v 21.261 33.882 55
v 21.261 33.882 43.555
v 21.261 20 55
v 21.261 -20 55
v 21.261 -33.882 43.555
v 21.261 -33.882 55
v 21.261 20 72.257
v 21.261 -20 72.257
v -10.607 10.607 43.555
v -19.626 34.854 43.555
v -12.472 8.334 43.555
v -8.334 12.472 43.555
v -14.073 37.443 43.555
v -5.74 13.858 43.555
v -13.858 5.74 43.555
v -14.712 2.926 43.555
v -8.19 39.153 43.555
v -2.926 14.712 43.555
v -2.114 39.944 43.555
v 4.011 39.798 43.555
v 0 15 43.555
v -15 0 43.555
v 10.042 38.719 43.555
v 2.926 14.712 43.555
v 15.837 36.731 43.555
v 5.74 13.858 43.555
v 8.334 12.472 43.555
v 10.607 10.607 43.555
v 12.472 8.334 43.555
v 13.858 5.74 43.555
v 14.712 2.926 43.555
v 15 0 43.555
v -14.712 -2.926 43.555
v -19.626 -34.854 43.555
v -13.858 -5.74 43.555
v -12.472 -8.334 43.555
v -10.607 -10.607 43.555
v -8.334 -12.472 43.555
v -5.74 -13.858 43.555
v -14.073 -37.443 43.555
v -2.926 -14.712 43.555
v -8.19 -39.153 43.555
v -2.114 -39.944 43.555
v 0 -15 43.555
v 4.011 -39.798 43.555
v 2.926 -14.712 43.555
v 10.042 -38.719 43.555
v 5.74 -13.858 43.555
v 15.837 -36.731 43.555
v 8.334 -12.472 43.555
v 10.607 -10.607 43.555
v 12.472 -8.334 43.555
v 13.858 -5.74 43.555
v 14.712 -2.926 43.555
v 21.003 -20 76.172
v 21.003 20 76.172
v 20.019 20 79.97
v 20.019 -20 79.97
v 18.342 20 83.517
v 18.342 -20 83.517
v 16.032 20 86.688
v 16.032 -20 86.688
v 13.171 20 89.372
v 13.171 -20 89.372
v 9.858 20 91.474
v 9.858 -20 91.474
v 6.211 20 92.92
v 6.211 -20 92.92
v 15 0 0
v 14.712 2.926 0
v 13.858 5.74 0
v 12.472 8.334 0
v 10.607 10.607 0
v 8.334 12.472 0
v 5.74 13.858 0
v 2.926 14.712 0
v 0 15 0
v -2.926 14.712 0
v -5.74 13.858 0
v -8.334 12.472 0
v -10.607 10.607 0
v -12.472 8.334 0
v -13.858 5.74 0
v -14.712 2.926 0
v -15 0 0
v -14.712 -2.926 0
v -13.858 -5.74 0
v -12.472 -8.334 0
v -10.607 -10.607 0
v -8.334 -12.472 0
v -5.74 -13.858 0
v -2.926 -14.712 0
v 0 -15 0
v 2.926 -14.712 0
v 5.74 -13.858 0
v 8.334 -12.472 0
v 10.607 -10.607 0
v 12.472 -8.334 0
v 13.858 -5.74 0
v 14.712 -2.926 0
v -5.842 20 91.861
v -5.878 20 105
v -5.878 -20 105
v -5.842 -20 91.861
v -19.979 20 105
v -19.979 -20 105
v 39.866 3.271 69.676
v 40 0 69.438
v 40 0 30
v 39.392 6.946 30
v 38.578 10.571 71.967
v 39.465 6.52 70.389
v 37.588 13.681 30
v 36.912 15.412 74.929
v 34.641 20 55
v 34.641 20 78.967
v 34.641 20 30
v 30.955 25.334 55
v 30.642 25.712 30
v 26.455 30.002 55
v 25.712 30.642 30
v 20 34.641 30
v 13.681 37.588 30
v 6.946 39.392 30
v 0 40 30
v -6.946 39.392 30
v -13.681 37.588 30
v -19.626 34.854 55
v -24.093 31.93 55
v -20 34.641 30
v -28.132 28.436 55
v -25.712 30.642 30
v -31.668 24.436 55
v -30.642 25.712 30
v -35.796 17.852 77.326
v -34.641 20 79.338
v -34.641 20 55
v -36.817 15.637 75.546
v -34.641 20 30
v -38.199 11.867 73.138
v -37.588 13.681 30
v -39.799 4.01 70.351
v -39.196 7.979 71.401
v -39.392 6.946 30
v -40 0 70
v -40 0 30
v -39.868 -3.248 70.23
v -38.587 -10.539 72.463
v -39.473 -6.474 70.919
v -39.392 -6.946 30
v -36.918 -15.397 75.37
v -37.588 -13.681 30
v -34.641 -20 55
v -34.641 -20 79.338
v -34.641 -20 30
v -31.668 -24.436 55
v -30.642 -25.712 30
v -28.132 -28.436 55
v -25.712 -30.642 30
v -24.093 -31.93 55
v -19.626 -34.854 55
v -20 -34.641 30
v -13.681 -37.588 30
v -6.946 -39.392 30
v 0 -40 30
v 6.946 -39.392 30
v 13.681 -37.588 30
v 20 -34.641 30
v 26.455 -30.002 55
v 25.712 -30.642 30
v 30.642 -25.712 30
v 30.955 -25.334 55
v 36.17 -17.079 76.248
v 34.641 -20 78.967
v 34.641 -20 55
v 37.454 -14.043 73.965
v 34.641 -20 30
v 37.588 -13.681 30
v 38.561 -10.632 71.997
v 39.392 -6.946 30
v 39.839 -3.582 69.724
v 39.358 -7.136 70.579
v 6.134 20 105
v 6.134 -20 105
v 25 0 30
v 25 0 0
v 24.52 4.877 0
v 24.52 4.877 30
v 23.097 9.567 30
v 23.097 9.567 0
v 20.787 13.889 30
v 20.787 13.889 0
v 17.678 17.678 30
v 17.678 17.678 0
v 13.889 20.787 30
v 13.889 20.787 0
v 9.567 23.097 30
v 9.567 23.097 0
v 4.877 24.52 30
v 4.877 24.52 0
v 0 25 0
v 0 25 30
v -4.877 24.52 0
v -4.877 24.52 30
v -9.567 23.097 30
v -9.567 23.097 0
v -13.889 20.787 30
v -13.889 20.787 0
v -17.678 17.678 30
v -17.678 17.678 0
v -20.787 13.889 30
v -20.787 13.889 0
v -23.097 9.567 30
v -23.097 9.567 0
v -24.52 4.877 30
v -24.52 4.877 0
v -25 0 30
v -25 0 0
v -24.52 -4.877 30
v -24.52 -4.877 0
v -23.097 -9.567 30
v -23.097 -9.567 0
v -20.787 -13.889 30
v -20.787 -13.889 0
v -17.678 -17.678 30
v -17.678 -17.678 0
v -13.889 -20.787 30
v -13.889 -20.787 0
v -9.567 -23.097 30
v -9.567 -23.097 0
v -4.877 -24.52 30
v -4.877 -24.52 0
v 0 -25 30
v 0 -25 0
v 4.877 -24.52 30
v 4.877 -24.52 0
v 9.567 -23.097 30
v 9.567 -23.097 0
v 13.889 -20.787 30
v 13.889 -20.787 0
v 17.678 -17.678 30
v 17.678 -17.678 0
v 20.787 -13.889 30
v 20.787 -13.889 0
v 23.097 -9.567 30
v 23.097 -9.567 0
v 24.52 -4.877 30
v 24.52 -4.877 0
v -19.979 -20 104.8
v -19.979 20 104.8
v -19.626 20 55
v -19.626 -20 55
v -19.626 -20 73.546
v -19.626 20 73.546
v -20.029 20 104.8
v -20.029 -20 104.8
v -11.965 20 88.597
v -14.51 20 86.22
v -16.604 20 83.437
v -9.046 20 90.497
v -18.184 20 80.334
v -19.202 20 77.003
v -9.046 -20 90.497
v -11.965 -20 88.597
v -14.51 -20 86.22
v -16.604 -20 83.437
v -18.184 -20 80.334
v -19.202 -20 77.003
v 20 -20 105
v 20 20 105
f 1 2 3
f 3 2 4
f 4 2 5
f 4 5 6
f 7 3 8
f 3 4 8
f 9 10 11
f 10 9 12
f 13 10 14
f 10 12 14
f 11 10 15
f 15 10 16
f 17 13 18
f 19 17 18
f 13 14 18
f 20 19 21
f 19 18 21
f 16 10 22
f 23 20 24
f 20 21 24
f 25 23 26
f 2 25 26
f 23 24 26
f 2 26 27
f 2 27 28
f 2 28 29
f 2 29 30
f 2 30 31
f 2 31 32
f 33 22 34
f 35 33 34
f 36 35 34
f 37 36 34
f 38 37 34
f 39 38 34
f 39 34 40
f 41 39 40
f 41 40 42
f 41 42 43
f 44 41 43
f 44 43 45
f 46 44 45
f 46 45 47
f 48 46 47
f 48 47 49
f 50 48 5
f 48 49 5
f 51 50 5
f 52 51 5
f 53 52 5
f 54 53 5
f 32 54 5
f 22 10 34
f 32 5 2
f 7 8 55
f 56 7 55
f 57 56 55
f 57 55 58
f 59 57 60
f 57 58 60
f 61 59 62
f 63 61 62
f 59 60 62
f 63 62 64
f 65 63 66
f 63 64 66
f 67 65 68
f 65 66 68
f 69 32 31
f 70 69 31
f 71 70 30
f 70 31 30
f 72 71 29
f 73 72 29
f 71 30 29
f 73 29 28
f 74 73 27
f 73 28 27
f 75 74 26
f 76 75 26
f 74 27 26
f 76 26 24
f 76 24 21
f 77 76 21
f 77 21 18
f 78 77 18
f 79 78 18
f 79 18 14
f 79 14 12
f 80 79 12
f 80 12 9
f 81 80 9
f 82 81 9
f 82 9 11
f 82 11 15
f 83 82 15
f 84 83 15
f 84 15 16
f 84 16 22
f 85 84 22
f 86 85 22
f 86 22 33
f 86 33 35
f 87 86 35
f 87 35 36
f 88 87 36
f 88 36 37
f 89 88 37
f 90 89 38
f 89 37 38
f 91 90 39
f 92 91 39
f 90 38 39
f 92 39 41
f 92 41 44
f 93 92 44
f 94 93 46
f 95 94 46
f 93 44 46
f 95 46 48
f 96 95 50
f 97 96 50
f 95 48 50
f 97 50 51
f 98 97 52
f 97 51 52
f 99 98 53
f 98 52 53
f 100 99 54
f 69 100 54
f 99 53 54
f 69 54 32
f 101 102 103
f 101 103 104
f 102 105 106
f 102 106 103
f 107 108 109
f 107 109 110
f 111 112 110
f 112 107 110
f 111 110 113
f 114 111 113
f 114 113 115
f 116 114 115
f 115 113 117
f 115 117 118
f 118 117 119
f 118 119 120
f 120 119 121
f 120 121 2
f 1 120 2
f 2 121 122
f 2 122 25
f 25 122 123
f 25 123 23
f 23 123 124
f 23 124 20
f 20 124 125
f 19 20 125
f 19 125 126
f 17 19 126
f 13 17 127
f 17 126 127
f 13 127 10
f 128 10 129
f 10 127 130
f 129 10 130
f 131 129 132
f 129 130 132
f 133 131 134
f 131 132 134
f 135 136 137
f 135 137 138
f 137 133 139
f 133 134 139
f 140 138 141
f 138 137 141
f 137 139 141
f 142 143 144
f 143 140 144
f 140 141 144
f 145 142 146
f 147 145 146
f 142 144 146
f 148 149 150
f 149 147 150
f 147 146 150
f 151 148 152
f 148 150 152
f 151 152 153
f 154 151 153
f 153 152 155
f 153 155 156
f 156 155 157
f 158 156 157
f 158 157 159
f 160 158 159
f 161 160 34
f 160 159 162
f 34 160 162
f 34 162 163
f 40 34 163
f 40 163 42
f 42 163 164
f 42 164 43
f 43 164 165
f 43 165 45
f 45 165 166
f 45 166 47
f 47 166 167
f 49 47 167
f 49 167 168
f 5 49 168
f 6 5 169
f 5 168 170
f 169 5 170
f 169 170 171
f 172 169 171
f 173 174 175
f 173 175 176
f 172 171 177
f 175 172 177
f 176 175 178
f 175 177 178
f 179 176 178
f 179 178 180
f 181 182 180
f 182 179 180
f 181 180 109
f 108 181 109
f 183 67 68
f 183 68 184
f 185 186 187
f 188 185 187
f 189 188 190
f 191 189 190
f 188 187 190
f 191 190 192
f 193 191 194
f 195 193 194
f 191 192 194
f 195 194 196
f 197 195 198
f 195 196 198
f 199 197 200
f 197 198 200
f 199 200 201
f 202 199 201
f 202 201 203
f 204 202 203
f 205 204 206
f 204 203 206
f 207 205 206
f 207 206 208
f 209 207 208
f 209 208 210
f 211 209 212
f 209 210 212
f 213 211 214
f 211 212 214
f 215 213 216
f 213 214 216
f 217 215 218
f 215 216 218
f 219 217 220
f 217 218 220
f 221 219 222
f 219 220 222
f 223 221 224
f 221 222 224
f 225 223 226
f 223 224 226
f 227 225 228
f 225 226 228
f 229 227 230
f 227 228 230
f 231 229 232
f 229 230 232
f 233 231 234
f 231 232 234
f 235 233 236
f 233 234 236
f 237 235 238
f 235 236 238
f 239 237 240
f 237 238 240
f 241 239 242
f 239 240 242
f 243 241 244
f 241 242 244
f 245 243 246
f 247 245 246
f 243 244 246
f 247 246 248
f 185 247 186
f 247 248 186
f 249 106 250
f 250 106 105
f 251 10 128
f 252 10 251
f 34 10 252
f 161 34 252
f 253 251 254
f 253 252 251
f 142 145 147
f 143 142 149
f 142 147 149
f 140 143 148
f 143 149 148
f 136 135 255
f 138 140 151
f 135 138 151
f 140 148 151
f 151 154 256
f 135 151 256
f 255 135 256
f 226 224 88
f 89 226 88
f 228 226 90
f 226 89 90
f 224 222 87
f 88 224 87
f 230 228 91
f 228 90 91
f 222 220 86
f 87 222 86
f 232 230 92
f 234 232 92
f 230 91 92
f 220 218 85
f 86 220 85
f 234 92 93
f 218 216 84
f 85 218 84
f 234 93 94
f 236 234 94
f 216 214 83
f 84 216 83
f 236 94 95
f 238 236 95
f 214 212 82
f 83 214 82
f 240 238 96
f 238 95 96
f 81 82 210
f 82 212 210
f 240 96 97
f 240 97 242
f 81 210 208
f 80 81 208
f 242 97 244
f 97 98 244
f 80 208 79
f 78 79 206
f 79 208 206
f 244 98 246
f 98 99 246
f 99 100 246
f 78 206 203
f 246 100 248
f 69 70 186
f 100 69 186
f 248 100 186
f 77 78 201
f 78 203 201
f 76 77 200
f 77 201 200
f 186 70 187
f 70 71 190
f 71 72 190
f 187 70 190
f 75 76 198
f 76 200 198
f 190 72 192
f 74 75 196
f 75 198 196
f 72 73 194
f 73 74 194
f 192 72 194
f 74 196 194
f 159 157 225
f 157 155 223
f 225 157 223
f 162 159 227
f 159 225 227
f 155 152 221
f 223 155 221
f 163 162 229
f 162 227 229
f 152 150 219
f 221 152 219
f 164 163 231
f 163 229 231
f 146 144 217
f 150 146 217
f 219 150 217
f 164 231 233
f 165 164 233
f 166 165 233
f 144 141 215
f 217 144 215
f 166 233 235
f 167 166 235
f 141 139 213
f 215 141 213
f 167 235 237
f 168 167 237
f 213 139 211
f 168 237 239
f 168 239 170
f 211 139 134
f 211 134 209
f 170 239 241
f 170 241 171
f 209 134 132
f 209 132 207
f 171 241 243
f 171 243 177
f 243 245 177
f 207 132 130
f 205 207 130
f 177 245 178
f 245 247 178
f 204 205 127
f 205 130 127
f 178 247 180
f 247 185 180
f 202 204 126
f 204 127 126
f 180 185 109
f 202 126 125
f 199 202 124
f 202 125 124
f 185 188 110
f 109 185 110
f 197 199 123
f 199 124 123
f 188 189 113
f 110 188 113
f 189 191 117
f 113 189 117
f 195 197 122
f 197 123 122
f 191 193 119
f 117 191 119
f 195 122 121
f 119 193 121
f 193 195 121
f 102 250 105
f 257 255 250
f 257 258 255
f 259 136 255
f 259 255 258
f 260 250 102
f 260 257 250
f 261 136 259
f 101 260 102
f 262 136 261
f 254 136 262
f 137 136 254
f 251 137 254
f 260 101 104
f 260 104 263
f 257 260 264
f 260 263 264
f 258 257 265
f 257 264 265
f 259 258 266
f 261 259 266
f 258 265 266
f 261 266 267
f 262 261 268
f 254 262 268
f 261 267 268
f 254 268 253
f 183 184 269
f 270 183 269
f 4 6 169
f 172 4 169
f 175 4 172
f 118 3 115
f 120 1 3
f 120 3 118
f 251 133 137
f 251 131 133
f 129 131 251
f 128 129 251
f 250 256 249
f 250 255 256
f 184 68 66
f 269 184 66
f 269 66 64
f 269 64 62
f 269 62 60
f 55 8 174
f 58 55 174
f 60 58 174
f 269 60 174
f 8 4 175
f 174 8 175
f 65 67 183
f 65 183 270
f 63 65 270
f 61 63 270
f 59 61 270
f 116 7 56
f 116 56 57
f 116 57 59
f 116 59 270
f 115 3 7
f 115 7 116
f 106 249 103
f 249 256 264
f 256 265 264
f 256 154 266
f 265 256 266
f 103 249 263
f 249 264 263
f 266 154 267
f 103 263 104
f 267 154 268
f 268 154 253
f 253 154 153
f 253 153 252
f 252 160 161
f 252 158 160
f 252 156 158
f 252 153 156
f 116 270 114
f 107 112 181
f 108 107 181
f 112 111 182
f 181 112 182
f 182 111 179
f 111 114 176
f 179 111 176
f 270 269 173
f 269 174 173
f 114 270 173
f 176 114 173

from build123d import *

# Parameters (mm, degrees)
PAD004_DEPTH    = 50
PAD003_DEPTH    = 50
BOX001_W        = 33
BOX001_H        = 20
BOX001_DEPTH    = 51
BOX_W           = 33
BOX_H           = 20
BOX_DEPTH       = 51
BOX002_W        = 33
BOX002_H        = 20
BOX002_DEPTH    = 51
BOX003_W        = 33
BOX003_H        = 20
BOX003_DEPTH    = 51
SKETCH_R        = 25
PAD_DEPTH       = 30
PAD002_DEPTH    = 50
SKETCH001_R     = 40
PAD001_DEPTH    = 75
SKETCH005_W     = 21.319589
SKETCH005_H     = 49.375387
POCKET_DEPTH    = 0.2
SKETCH006_R     = 15
POCKET001_DEPTH = 43.555516


with BuildPart() as pad004:
    # Sketch004 → Pad004 (new body, symmetric)
    with BuildSketch(Plane.XZ):
        Polygon((-40, 70), (-20, 104.849875), (-40, 104.849875), align=None)
    extrude(amount=PAD004_DEPTH, both=True)


with BuildPart() as pad003:
    # Sketch003 → Pad003 (new body, symmetric)
    with BuildSketch(Plane.XZ):
        Polygon((20, 105), (40, 69.438118), (40, 105), align=None)
    extrude(amount=PAD003_DEPTH, both=True)


with BuildPart() as cubo001:
    # Box001 → Box001 (new body)
    with BuildSketch(Plane(origin=(5, -40, 55), x_dir=(1, 0, 0), z_dir=(0, 0, 1))):
        with Locations((16.5, 10)):
            Rectangle(BOX001_W, BOX001_H)
    extrude(amount=BOX001_DEPTH)


with BuildPart() as cubo:
    # Box → Box (new body)
    with BuildSketch(Plane(origin=(5, 20, 55), x_dir=(1, 0, 0), z_dir=(0, 0, 1))):
        with Locations((16.5, 10)):
            Rectangle(BOX_W, BOX_H)
    extrude(amount=BOX_DEPTH)


with BuildPart() as cubo002:
    # Box002 → Box002 (new body)
    with BuildSketch(Plane(origin=(-38, -40, 55), x_dir=(1, 0, 0), z_dir=(0, 0, 1))):
        with Locations((16.5, 10)):
            Rectangle(BOX002_W, BOX002_H)
    extrude(amount=BOX002_DEPTH)


with BuildPart() as cubo003:
    # Box003 → Box003 (new body)
    with BuildSketch(Plane(origin=(-38, 20, 55), x_dir=(1, 0, 0), z_dir=(0, 0, 1))):
        with Locations((16.5, 10)):
            Rectangle(BOX003_W, BOX003_H)
    extrude(amount=BOX003_DEPTH)


with BuildPart() as pad:
    # Sketch → Pad (new body)
    with BuildSketch(Plane.XY):
        Circle(SKETCH_R)
    extrude(amount=PAD_DEPTH)


with BuildPart() as pad002:
    # Sketch002 → Pad002 (new body, symmetric)
    with BuildSketch(Plane(origin=(-81, 0, 6), x_dir=(1, 0, 0), z_dir=(0, -1, 0))):
        with BuildLine():
            Line((61.374028, 37.554516), (102.260882, 37.554516))
            Line((102.260882, 37.554516), (102.260882, 66.257331))
            ThreePointArc((102.260882, 66.257331), (98.26163, 79.156523), (87.211113, 86.919851))
            Line((87.211113, 86.919851), (87.11186, 102.554516))
            Line((87.11186, 102.554516), (75.11186, 102.554516))
            Line((75.11186, 102.554516), (75.158353, 85.860966))
            ThreePointArc((75.158353, 85.860966), (65.381997, 78.874221), (61.374028, 67.54603))
            Line((61.374028, 37.554516), (61.374028, 67.54603))
        make_face()
    extrude(amount=PAD002_DEPTH, both=True)


with BuildPart() as pocket001:
    # Pad001 base: copy of Pad
    add(pad.part)

    # Sketch001 → Pad001 (new body)
    with BuildSketch(Plane.XY.offset(30)):
        Circle(SKETCH001_R)
    extrude(amount=PAD001_DEPTH)

    # Cut: cut Pad002
    add(pad002.part, mode=Mode.SUBTRACT)

    # Fusion: union Pad
    add(pad.part)

    # Cut001: cut Cubo003
    add(cubo003.part, mode=Mode.SUBTRACT)

    # Cut002: cut Cubo002
    add(cubo002.part, mode=Mode.SUBTRACT)

    # Cut003: cut Cubo
    add(cubo.part, mode=Mode.SUBTRACT)

    # Cut004: cut Cubo001
    add(cubo001.part, mode=Mode.SUBTRACT)

    # Cut005: cut Pad003
    add(pad003.part, mode=Mode.SUBTRACT)

    # Cut006: cut Pad004
    add(pad004.part, mode=Mode.SUBTRACT)

    # Sketch005 → Pocket (cut)
    with BuildSketch(Plane.XY.offset(105)):
        with Locations((-30.63901, -1.115778)):
            Rectangle(SKETCH005_W, SKETCH005_H)
    extrude(amount=-POCKET_DEPTH, mode=Mode.SUBTRACT)

    # Sketch006 → Pocket001 (cut, through all)
    with BuildSketch(Plane.XY.offset(43.554516)):
        Circle(SKETCH006_R)
    extrude(amount=-POCKET001_DEPTH, mode=Mode.SUBTRACT)


solid = pocket001.part
